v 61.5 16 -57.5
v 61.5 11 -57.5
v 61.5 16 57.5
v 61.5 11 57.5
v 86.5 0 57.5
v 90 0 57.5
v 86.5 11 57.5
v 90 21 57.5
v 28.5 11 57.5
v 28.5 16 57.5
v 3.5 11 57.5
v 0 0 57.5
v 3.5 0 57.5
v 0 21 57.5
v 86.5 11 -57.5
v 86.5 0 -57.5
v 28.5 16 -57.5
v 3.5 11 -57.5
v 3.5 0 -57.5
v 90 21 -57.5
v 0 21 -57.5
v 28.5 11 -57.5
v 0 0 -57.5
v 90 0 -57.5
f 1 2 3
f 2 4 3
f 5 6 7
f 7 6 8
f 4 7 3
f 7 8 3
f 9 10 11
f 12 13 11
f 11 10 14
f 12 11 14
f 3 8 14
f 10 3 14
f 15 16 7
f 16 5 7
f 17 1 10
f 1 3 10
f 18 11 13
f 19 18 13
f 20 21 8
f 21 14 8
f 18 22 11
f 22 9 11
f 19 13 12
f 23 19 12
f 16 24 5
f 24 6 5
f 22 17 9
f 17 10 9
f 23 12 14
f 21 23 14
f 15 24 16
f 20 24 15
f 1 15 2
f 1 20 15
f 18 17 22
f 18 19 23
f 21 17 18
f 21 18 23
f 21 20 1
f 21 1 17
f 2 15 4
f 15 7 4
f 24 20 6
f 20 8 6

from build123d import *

# Parameters (mm, degrees)
BOSS_EXTRUDE1_DEPTH = 57.5


with BuildPart() as part:
    # Sketch1 → Boss-Extrude1 (new, symmetric)
    with BuildSketch(Plane.XY):
        Polygon((0, 0), (0, 21), (90, 21), (90, 0), (86.5, 0), (86.5, 11), (61.5, 11), (61.5, 16), (28.5, 16), (28.5, 11), (3.5, 11), (3.5, 0), align=None)
    extrude(amount=BOSS_EXTRUDE1_DEPTH, both=True)


solid = part.part
